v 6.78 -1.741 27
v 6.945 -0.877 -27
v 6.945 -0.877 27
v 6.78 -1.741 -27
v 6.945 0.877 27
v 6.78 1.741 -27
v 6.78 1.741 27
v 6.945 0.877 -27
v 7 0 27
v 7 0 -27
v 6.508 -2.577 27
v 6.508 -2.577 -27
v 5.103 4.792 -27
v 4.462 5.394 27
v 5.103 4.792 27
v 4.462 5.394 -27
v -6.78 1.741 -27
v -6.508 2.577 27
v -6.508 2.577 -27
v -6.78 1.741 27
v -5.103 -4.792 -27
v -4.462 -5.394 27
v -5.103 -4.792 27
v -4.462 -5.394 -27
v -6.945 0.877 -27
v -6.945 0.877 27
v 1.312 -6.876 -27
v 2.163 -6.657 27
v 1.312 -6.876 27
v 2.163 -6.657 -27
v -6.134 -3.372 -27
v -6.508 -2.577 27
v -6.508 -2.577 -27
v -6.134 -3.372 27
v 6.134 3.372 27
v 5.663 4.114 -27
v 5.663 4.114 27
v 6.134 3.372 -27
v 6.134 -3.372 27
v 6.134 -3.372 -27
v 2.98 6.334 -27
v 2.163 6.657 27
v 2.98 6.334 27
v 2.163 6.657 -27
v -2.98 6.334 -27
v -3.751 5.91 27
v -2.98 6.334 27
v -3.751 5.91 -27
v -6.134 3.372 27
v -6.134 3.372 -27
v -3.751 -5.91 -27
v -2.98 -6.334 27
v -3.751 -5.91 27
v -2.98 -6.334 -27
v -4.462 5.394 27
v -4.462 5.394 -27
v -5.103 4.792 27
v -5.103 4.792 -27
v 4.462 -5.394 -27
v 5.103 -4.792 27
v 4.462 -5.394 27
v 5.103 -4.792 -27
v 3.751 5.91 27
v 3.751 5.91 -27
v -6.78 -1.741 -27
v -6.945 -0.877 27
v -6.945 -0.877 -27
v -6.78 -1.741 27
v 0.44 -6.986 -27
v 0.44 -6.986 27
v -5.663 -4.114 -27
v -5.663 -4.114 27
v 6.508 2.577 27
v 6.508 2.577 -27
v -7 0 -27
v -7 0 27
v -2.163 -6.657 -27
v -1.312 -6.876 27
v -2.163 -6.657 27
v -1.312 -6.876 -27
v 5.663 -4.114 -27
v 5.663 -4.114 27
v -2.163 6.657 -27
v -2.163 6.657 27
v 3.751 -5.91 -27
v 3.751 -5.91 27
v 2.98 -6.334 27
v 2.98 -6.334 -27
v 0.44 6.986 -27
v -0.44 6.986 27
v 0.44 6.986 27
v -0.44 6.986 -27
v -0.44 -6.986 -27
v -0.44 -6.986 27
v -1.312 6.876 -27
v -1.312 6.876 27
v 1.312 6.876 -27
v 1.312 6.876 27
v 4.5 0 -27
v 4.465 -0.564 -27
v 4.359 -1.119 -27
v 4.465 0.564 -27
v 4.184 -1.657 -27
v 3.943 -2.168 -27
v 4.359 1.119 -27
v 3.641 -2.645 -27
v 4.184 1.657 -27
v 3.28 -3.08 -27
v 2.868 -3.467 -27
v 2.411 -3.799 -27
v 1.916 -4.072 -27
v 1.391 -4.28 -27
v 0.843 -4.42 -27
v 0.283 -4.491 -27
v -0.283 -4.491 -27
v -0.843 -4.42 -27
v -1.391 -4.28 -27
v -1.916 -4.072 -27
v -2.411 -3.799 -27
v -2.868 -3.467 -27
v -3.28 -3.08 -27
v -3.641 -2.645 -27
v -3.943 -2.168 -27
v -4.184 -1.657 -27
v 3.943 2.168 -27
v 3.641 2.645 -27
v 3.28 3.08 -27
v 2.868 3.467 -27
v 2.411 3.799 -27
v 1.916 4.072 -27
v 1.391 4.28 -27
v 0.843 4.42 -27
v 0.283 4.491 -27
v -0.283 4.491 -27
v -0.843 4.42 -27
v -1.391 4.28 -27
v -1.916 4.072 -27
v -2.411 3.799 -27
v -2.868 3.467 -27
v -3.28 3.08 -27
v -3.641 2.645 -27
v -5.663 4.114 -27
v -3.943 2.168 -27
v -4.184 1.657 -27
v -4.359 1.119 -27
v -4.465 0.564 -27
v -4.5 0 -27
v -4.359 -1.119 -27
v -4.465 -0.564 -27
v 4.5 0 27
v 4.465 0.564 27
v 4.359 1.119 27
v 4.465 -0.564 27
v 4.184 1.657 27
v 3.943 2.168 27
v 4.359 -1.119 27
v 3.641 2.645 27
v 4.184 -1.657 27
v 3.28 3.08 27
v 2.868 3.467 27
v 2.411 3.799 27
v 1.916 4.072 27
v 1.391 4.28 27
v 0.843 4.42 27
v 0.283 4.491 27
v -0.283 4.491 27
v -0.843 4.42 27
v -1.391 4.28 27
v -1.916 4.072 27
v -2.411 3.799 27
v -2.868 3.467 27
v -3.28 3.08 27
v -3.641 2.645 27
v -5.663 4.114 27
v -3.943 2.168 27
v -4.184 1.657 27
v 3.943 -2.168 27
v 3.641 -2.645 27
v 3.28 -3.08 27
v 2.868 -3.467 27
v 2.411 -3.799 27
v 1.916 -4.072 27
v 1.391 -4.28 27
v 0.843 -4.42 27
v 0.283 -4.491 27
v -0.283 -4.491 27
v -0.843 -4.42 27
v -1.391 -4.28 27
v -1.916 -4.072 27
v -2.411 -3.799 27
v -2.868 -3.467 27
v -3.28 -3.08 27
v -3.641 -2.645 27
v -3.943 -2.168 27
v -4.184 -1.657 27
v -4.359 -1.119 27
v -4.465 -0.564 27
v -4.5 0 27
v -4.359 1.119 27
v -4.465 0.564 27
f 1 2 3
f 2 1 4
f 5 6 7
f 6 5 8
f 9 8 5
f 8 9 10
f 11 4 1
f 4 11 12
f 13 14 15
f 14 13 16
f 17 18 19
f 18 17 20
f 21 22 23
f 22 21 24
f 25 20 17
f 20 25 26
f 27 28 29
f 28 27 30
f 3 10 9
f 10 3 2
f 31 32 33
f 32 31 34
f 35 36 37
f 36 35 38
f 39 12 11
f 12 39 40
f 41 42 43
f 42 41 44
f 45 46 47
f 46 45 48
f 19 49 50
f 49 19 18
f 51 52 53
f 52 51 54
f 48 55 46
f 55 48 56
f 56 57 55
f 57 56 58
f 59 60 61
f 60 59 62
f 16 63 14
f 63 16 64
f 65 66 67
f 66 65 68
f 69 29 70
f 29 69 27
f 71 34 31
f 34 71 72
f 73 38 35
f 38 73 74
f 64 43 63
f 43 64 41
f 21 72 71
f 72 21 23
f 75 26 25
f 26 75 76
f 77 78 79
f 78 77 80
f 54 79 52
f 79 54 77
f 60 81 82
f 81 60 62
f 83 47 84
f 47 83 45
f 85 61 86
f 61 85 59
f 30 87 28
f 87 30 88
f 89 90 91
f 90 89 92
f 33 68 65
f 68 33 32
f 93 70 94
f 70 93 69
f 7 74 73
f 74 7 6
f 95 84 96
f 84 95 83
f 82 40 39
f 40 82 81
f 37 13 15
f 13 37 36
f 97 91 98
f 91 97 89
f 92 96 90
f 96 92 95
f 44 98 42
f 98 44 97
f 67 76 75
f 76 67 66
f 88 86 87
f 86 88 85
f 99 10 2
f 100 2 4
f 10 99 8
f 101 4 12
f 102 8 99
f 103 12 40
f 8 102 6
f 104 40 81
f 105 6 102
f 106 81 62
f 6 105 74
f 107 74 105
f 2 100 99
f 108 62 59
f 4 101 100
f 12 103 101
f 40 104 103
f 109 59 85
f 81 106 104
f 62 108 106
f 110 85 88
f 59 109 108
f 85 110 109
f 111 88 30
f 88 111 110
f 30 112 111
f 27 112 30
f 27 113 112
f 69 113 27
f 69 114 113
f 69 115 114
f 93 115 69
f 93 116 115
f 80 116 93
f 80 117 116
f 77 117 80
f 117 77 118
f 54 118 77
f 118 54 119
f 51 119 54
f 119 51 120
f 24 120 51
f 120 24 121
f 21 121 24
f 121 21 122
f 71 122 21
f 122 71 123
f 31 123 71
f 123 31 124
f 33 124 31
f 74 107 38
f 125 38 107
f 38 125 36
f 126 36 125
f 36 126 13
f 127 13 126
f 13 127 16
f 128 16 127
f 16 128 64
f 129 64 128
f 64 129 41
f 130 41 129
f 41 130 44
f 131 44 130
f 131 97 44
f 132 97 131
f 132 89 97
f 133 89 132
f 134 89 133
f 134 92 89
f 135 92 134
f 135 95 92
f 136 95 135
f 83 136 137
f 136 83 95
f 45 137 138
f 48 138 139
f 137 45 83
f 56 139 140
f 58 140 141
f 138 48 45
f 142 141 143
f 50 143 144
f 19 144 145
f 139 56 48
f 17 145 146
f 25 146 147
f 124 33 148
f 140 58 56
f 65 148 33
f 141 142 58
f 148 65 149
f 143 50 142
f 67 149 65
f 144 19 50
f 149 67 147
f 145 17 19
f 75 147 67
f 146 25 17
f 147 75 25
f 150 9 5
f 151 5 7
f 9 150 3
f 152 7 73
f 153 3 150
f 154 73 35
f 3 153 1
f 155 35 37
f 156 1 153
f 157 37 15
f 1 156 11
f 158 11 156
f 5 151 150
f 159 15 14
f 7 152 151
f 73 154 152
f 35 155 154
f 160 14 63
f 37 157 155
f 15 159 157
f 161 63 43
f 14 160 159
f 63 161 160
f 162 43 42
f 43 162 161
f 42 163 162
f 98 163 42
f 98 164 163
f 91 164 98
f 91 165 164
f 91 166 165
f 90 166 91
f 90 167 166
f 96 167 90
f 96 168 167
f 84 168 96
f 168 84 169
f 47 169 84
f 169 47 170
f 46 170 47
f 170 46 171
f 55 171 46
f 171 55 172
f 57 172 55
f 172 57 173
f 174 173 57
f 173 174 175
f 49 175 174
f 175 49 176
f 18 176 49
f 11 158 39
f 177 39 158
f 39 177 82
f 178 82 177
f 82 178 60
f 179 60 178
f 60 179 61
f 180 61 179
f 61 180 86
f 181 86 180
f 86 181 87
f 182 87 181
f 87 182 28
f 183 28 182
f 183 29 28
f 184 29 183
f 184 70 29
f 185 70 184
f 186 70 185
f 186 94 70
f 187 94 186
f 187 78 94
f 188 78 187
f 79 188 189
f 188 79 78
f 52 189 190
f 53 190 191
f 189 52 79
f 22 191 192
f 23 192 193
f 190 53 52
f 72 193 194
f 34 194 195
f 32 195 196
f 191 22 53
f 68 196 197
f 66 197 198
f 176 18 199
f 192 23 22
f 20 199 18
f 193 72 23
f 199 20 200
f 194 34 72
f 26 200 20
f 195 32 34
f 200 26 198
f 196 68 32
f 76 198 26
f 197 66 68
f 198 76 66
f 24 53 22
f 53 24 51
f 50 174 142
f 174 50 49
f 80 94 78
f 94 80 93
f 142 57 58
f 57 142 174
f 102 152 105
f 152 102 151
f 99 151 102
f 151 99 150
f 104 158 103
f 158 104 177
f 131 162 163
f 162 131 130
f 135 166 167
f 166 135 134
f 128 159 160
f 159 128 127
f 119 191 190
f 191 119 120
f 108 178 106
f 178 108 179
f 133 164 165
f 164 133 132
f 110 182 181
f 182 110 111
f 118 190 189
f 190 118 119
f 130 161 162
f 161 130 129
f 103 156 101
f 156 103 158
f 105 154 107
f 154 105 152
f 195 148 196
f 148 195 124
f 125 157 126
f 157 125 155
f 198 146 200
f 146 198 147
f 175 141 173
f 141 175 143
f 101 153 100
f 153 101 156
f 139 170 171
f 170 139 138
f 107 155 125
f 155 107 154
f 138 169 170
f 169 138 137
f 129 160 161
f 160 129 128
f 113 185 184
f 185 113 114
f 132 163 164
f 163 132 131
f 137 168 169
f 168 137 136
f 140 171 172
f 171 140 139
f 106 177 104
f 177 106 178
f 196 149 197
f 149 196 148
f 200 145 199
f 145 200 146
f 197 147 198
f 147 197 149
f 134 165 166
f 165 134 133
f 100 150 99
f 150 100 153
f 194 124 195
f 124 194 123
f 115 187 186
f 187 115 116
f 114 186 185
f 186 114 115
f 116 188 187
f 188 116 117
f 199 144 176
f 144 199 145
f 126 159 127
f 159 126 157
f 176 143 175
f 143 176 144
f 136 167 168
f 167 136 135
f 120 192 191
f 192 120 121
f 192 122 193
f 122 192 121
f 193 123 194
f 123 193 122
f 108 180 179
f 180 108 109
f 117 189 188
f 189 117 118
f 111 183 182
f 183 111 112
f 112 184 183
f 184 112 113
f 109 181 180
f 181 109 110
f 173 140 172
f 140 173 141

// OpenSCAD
$fn = 50;


difference() {
	union() {
		translate(v = [0, 0, -27.0000000000]) {
			cylinder(h = 54, r = 7.0000000000);
		}
	}
	union() {
		translate(v = [0, 0, -100.0000000000]) {
			cylinder(h = 200, r = 4.5000000000);
		}
	}
}
